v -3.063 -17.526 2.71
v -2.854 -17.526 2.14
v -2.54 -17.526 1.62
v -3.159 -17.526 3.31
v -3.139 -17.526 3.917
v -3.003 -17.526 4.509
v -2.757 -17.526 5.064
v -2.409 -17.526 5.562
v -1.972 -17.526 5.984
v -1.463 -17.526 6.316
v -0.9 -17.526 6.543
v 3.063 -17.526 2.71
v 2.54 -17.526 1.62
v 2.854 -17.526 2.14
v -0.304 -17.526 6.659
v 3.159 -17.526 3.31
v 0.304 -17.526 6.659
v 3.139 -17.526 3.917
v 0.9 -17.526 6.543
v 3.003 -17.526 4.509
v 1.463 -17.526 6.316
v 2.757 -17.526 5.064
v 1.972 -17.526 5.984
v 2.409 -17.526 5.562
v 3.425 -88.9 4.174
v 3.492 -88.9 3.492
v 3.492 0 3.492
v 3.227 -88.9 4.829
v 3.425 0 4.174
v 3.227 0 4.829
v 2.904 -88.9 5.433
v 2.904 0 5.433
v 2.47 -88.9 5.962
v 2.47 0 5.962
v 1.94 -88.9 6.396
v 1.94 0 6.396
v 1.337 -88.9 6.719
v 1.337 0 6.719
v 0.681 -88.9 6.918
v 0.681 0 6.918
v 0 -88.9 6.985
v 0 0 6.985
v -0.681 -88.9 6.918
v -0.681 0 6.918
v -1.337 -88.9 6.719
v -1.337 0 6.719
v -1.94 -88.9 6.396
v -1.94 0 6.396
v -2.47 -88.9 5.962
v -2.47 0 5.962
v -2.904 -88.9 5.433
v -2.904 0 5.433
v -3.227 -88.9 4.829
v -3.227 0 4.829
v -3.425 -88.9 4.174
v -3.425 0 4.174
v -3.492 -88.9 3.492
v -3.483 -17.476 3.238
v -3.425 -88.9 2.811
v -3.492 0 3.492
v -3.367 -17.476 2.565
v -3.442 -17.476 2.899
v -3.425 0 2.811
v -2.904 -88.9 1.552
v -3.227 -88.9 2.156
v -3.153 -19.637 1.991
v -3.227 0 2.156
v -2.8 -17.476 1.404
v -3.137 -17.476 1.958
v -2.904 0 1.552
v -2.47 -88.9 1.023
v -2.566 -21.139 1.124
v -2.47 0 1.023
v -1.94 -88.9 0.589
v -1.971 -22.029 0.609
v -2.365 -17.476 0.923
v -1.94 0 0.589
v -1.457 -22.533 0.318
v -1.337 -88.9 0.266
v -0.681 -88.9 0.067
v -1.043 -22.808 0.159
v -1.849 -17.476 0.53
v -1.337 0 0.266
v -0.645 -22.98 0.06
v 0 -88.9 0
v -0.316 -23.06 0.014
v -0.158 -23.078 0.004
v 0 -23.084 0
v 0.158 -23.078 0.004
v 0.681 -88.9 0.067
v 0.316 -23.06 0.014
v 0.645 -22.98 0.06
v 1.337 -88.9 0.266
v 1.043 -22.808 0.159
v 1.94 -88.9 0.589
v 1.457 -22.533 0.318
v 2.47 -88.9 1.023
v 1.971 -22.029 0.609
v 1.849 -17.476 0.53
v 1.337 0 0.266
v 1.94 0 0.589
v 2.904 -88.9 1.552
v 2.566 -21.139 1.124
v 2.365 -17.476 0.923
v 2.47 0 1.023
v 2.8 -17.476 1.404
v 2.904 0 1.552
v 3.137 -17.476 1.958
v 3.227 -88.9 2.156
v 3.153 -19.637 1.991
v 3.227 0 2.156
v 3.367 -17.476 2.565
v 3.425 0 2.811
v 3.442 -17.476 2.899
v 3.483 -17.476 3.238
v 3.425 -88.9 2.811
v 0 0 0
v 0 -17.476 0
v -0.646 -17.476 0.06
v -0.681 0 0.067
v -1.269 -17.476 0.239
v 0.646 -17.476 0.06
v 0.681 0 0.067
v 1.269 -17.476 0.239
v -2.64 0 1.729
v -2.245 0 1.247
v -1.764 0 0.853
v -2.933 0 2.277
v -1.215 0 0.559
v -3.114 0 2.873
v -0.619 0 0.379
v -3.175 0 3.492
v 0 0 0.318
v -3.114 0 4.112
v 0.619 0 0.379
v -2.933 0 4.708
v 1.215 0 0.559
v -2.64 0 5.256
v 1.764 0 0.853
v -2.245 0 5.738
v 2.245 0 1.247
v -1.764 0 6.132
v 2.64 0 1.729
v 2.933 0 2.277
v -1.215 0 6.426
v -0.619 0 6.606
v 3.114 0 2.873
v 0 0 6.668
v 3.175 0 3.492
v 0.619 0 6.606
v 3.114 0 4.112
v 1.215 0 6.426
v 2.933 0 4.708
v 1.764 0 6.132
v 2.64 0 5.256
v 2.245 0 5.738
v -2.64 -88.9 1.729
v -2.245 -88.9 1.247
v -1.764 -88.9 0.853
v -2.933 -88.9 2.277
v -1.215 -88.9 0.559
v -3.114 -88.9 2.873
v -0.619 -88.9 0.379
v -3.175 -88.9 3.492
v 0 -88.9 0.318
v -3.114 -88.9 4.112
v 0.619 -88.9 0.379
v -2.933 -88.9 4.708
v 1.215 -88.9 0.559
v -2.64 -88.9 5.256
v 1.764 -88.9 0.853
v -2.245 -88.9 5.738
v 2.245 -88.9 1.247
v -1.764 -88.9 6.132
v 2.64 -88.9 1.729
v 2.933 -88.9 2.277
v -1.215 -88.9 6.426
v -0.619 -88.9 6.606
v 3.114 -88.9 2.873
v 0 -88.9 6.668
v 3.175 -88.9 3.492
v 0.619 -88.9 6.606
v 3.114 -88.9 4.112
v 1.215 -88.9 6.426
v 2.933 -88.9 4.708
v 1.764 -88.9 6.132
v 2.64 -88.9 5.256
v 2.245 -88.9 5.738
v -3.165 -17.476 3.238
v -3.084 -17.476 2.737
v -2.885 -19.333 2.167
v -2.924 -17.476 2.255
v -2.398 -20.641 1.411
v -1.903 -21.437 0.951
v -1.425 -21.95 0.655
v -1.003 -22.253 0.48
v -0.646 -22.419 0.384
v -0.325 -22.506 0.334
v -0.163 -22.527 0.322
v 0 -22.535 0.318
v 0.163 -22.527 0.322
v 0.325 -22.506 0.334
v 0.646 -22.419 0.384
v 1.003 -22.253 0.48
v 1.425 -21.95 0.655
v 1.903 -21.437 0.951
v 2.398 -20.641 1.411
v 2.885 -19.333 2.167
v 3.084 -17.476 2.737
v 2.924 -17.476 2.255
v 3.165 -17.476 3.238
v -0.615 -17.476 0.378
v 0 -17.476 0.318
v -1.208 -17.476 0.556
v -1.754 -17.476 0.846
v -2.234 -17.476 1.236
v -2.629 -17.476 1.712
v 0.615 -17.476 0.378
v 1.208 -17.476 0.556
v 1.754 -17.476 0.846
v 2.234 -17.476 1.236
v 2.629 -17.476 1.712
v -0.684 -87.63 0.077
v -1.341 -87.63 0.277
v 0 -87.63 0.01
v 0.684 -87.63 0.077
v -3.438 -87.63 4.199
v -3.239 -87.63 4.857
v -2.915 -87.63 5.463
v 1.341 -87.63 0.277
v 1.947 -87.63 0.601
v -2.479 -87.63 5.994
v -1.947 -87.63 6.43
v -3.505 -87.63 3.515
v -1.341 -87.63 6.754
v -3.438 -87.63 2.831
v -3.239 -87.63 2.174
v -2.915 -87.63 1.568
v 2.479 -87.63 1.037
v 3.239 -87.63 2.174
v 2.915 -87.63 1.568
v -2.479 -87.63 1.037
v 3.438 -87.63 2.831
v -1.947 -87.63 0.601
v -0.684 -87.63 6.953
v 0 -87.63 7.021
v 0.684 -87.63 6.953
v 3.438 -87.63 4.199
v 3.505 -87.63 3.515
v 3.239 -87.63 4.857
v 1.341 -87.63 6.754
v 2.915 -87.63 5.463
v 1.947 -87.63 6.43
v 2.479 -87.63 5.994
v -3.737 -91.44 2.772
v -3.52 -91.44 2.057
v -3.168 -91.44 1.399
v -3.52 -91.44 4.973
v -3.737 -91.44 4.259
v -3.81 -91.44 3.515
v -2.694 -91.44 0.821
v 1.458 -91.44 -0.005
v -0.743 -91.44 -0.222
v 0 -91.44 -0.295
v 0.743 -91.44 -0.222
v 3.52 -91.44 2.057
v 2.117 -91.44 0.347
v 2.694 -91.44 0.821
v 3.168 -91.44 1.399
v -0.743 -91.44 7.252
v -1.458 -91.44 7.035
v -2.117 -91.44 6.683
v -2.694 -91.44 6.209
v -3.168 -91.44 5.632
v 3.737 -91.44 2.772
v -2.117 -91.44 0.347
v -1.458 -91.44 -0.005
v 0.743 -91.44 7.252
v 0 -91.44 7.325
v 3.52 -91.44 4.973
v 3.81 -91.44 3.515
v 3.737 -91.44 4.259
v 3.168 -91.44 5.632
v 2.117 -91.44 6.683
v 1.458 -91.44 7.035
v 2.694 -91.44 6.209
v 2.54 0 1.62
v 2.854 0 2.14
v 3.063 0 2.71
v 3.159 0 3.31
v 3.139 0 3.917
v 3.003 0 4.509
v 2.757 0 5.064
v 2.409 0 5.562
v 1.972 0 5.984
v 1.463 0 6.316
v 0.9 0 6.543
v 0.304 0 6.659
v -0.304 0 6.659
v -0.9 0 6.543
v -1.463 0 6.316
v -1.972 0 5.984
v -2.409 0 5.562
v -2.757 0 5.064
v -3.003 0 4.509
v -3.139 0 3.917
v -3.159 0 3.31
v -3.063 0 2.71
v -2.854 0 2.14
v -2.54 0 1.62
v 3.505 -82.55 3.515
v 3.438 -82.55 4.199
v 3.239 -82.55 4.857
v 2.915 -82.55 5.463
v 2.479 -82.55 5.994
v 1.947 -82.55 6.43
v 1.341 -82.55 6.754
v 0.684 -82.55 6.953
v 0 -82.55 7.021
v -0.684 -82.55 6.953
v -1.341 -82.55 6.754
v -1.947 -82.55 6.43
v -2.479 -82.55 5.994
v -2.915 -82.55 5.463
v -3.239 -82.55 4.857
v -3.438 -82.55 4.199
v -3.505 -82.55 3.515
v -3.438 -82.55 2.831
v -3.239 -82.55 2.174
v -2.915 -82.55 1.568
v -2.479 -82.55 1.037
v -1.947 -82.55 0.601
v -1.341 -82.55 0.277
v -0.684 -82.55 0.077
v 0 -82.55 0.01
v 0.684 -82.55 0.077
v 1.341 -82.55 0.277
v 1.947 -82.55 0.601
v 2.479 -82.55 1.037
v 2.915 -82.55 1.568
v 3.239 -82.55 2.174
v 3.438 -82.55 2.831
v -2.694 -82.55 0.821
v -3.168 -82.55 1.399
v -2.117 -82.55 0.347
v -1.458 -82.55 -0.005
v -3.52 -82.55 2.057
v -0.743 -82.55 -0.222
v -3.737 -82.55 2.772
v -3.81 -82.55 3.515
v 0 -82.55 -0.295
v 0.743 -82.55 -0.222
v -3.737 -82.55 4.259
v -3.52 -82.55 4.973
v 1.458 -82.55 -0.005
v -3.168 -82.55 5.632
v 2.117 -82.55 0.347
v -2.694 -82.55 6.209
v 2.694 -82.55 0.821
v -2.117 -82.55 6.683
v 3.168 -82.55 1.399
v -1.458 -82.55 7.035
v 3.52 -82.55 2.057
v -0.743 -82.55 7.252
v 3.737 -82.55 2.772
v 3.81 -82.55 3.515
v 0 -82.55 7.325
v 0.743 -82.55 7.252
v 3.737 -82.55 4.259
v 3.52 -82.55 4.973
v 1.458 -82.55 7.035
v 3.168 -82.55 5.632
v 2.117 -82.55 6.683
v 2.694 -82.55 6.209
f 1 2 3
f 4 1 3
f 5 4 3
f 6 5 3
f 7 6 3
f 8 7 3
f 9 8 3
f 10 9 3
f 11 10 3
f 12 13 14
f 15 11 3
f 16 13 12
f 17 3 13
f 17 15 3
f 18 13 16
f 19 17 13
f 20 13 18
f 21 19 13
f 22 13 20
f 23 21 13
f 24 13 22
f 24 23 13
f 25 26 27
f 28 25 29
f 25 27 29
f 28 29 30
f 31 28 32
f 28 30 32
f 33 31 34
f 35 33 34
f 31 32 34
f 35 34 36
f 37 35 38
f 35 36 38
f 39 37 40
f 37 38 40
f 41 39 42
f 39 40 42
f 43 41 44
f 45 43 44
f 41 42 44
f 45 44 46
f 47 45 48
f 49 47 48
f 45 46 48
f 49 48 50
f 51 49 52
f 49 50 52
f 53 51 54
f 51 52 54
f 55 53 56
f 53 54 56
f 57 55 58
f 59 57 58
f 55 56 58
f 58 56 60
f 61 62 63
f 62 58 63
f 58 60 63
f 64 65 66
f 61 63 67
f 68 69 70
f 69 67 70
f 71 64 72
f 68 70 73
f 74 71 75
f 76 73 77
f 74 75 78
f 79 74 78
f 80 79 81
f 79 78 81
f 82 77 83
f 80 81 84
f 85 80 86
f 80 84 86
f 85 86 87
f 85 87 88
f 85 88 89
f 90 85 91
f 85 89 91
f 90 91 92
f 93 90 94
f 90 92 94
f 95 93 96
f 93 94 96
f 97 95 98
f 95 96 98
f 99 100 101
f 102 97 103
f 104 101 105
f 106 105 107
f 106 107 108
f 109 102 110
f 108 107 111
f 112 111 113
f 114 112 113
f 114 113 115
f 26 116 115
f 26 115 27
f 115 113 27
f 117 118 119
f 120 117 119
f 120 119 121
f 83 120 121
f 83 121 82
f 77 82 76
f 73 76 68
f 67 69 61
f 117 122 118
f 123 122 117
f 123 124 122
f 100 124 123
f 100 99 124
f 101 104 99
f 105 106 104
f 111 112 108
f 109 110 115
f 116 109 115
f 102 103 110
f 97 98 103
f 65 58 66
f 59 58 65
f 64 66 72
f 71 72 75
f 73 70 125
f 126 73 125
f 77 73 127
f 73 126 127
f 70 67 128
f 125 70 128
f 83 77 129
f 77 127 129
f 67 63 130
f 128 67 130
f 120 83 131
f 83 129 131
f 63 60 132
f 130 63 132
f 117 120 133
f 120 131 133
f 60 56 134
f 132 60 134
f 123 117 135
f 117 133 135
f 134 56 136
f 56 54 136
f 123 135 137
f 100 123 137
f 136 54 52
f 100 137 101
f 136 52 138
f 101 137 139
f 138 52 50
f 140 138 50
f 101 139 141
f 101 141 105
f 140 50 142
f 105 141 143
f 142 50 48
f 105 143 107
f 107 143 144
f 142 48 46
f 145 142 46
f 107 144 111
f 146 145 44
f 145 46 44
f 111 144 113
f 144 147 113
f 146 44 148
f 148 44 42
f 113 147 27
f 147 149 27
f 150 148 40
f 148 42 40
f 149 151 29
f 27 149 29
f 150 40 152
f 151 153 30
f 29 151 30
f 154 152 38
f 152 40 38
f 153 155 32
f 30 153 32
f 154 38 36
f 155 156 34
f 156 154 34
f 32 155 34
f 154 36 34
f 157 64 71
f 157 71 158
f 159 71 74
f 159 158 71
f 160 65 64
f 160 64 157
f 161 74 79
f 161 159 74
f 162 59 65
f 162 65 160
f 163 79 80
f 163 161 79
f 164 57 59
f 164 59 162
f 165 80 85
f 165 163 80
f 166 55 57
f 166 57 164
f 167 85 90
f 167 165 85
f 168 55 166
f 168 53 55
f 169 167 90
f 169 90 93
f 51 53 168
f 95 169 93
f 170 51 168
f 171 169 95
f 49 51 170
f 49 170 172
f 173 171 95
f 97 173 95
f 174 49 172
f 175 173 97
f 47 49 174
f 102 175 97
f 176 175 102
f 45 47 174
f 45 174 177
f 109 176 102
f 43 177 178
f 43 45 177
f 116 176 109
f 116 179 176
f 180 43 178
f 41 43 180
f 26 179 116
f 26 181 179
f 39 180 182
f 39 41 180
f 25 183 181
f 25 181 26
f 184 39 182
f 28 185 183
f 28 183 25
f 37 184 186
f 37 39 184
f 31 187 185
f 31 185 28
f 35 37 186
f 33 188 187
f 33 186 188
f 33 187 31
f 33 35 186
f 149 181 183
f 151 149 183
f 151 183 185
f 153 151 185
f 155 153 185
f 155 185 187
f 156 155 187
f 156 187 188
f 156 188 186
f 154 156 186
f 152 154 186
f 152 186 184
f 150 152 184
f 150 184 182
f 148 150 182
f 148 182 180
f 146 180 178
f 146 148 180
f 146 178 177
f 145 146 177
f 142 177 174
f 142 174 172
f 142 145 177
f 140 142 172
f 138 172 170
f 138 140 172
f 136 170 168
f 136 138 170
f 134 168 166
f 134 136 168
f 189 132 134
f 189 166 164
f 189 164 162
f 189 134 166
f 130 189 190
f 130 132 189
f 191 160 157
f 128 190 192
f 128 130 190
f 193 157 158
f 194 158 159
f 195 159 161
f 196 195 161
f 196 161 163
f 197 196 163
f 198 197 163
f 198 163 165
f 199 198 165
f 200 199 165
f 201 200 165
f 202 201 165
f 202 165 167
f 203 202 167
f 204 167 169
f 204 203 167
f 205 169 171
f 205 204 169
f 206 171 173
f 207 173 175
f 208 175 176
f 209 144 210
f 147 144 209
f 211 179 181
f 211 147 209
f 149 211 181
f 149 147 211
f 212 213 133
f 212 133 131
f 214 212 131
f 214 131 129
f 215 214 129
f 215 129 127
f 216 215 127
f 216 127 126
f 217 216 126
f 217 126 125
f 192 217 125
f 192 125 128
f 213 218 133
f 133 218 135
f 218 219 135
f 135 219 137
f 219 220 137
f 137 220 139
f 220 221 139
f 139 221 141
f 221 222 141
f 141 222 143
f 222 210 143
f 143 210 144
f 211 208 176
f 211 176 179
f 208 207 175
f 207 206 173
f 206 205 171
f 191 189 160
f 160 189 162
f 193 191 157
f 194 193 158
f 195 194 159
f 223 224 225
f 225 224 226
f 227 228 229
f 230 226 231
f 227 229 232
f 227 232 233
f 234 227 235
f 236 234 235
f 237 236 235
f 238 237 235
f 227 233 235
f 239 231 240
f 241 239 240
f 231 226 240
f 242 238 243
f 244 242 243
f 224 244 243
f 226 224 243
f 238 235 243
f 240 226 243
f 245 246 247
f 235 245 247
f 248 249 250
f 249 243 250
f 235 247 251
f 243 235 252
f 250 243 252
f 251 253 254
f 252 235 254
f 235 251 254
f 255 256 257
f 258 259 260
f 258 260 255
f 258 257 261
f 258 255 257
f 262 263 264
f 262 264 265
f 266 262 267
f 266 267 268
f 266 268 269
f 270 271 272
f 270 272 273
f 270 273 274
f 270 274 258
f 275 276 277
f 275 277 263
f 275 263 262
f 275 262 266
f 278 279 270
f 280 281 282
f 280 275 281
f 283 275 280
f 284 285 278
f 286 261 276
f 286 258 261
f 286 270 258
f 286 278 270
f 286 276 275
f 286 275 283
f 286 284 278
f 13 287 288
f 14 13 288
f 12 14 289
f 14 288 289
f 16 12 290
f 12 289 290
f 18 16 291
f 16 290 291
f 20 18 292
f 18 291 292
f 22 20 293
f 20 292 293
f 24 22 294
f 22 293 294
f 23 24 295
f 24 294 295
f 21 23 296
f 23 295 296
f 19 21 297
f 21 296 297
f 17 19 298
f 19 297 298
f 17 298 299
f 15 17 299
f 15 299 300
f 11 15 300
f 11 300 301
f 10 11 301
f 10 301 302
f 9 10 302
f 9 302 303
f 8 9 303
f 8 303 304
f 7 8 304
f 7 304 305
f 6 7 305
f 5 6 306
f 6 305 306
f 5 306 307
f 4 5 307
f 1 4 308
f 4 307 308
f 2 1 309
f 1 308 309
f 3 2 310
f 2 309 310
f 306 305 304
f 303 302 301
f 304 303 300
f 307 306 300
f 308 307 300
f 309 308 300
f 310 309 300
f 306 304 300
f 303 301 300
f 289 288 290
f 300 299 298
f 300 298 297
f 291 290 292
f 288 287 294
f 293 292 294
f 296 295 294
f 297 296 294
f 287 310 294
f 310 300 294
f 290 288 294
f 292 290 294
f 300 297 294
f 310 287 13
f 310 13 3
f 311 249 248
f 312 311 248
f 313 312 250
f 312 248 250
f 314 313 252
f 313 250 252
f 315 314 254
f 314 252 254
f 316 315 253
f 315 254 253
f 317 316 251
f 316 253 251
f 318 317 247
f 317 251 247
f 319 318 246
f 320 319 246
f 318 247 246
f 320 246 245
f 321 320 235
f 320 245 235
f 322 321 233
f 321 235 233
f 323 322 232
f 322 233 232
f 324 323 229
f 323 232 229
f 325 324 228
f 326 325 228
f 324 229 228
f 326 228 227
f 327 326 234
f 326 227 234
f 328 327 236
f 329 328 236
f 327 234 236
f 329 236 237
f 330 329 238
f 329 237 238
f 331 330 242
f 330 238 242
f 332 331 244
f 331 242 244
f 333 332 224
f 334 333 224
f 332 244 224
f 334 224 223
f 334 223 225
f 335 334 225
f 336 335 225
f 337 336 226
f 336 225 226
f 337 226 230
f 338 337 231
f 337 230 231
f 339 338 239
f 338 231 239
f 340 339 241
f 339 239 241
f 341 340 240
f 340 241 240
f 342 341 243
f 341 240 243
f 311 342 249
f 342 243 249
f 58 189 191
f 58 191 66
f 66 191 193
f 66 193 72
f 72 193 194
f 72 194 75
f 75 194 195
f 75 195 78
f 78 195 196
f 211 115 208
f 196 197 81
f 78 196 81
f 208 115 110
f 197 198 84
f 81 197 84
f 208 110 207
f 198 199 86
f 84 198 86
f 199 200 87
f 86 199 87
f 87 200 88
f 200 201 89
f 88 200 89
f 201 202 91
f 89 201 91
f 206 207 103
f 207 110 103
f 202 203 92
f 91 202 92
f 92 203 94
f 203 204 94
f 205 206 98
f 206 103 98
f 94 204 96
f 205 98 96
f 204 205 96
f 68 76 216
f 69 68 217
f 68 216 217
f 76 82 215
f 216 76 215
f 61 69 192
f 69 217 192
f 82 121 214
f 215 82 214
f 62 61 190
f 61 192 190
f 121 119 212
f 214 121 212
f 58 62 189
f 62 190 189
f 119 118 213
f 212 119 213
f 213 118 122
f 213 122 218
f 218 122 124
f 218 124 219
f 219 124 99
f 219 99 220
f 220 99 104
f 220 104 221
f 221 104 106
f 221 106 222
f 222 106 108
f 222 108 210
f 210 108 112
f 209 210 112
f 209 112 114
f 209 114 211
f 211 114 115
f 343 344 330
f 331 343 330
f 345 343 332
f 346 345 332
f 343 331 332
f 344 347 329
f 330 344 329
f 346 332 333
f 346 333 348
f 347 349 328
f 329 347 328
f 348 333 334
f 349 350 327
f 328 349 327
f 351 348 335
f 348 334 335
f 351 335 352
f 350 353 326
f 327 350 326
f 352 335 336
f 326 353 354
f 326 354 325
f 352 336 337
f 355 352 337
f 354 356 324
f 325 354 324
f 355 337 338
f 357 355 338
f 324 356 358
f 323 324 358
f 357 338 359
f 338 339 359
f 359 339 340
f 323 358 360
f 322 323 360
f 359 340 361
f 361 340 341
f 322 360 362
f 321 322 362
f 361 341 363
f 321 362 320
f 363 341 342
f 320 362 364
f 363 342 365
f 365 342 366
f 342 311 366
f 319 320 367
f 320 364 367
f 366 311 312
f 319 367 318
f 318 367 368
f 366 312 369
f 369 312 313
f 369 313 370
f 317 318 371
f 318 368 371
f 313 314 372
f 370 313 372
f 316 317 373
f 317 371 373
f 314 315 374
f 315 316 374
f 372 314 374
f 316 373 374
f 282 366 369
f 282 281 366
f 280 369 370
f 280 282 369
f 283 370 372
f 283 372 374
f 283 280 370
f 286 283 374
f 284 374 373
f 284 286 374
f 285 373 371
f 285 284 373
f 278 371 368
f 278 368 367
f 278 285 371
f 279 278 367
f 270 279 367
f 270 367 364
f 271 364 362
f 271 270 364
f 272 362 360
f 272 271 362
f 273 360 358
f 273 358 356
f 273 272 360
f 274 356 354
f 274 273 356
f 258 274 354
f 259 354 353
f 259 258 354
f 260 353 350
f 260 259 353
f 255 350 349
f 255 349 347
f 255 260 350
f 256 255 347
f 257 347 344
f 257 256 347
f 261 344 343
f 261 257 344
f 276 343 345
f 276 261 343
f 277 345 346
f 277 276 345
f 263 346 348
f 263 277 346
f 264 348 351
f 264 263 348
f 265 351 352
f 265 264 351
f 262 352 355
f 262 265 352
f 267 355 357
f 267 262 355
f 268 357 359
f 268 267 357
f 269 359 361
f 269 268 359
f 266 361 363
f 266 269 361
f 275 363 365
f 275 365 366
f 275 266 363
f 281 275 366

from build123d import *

# Parameters (mm, degrees)
F0_R           = 3.4925
F0_R_2         = 3.175
F2_DEPTH       = 88.9
F3_DEPTH       = 25.4
F4_DEPTH       = 25.4
F4_DEPTH_BACK  = 25.4
F5_R           = 3.1654105668
F6_DEPTH       = 17.526
F8_DEPTH       = 17.78
F10_R          = 3.81
F11_DEPTH      = 2.54
F11_DEPTH_BACK = 6.35
F13_START      = -1.27
F12_R          = 3.505349202
F13_DEPTH      = 5.08


with BuildPart() as f2:
    # F0 (on Front) → F2 (new body)
    with BuildSketch(Plane.XZ):
        with Locations((0, 3.4925)):
            Circle(F0_R)
        with Locations((0, 3.4925)):
            Circle(F0_R_2, mode=Mode.SUBTRACT)
    extrude(amount=F2_DEPTH)

    # F0 (on Front) → F3 (join)
    with BuildSketch(Plane.XZ):
        with Locations((0, 3.4925)):
            Circle(F0_R)
        with Locations((0, 3.4925)):
            Circle(F0_R_2, mode=Mode.SUBTRACT)
    extrude(amount=F3_DEPTH)

    # F1 (on Right) → F4 (cut, two sides)
    with BuildSketch(Plane.YZ) as f4_sk:
        Polygon((-17.4764418069, -3.2384999853), (-17.4761328944, 0), (-23.0844528944, 0), align=None)
        Polygon((-23.0844528944, 0), (-17.4761328944, 0), (-17.4764418069, 3.2384999853), align=None)
    extrude(amount=-F4_DEPTH, mode=Mode.SUBTRACT)
    extrude(f4_sk.sketch, amount=F4_DEPTH_BACK, mode=Mode.SUBTRACT)


with BuildPart() as f6:
    # F5 (on Front) → F6 (new body)
    with BuildSketch(Plane.XZ):
        with Locations((0, 3.5086502321)):
            Circle(F5_R)
    extrude(amount=F6_DEPTH)

    # F7 (on face) → F8 (cut)
    with BuildSketch(Plane.XZ.offset(17.526)):
        with BuildLine():
            ThreePointArc((-2.54, 1.6196758924), (0, 0.3358029715), (2.54, 1.6196758924))
            Line((2.54, 1.6196758924), (-2.54, 1.6196758924))
        make_face()
    extrude(amount=-F8_DEPTH, mode=Mode.SUBTRACT)


with BuildPart() as f11:
    # F10 (on offset) → F11 (new body, two sides)
    with BuildSketch(Plane.XZ.offset(88.9)) as f11_sk:
        with Locations((0, 3.5152491958)):
            Circle(F10_R)
    extrude(amount=F11_DEPTH)
    extrude(f11_sk.sketch, amount=-F11_DEPTH_BACK)

    # F12 (on offset) → F13 (cut)
    with BuildSketch(Plane.XZ.offset(88.9).offset(F13_START)):
        with Locations((0, 3.5152491958)):
            Circle(F12_R)
    extrude(amount=-F13_DEPTH, mode=Mode.SUBTRACT)


solid = Compound([f2.part, f6.part, f11.part])
